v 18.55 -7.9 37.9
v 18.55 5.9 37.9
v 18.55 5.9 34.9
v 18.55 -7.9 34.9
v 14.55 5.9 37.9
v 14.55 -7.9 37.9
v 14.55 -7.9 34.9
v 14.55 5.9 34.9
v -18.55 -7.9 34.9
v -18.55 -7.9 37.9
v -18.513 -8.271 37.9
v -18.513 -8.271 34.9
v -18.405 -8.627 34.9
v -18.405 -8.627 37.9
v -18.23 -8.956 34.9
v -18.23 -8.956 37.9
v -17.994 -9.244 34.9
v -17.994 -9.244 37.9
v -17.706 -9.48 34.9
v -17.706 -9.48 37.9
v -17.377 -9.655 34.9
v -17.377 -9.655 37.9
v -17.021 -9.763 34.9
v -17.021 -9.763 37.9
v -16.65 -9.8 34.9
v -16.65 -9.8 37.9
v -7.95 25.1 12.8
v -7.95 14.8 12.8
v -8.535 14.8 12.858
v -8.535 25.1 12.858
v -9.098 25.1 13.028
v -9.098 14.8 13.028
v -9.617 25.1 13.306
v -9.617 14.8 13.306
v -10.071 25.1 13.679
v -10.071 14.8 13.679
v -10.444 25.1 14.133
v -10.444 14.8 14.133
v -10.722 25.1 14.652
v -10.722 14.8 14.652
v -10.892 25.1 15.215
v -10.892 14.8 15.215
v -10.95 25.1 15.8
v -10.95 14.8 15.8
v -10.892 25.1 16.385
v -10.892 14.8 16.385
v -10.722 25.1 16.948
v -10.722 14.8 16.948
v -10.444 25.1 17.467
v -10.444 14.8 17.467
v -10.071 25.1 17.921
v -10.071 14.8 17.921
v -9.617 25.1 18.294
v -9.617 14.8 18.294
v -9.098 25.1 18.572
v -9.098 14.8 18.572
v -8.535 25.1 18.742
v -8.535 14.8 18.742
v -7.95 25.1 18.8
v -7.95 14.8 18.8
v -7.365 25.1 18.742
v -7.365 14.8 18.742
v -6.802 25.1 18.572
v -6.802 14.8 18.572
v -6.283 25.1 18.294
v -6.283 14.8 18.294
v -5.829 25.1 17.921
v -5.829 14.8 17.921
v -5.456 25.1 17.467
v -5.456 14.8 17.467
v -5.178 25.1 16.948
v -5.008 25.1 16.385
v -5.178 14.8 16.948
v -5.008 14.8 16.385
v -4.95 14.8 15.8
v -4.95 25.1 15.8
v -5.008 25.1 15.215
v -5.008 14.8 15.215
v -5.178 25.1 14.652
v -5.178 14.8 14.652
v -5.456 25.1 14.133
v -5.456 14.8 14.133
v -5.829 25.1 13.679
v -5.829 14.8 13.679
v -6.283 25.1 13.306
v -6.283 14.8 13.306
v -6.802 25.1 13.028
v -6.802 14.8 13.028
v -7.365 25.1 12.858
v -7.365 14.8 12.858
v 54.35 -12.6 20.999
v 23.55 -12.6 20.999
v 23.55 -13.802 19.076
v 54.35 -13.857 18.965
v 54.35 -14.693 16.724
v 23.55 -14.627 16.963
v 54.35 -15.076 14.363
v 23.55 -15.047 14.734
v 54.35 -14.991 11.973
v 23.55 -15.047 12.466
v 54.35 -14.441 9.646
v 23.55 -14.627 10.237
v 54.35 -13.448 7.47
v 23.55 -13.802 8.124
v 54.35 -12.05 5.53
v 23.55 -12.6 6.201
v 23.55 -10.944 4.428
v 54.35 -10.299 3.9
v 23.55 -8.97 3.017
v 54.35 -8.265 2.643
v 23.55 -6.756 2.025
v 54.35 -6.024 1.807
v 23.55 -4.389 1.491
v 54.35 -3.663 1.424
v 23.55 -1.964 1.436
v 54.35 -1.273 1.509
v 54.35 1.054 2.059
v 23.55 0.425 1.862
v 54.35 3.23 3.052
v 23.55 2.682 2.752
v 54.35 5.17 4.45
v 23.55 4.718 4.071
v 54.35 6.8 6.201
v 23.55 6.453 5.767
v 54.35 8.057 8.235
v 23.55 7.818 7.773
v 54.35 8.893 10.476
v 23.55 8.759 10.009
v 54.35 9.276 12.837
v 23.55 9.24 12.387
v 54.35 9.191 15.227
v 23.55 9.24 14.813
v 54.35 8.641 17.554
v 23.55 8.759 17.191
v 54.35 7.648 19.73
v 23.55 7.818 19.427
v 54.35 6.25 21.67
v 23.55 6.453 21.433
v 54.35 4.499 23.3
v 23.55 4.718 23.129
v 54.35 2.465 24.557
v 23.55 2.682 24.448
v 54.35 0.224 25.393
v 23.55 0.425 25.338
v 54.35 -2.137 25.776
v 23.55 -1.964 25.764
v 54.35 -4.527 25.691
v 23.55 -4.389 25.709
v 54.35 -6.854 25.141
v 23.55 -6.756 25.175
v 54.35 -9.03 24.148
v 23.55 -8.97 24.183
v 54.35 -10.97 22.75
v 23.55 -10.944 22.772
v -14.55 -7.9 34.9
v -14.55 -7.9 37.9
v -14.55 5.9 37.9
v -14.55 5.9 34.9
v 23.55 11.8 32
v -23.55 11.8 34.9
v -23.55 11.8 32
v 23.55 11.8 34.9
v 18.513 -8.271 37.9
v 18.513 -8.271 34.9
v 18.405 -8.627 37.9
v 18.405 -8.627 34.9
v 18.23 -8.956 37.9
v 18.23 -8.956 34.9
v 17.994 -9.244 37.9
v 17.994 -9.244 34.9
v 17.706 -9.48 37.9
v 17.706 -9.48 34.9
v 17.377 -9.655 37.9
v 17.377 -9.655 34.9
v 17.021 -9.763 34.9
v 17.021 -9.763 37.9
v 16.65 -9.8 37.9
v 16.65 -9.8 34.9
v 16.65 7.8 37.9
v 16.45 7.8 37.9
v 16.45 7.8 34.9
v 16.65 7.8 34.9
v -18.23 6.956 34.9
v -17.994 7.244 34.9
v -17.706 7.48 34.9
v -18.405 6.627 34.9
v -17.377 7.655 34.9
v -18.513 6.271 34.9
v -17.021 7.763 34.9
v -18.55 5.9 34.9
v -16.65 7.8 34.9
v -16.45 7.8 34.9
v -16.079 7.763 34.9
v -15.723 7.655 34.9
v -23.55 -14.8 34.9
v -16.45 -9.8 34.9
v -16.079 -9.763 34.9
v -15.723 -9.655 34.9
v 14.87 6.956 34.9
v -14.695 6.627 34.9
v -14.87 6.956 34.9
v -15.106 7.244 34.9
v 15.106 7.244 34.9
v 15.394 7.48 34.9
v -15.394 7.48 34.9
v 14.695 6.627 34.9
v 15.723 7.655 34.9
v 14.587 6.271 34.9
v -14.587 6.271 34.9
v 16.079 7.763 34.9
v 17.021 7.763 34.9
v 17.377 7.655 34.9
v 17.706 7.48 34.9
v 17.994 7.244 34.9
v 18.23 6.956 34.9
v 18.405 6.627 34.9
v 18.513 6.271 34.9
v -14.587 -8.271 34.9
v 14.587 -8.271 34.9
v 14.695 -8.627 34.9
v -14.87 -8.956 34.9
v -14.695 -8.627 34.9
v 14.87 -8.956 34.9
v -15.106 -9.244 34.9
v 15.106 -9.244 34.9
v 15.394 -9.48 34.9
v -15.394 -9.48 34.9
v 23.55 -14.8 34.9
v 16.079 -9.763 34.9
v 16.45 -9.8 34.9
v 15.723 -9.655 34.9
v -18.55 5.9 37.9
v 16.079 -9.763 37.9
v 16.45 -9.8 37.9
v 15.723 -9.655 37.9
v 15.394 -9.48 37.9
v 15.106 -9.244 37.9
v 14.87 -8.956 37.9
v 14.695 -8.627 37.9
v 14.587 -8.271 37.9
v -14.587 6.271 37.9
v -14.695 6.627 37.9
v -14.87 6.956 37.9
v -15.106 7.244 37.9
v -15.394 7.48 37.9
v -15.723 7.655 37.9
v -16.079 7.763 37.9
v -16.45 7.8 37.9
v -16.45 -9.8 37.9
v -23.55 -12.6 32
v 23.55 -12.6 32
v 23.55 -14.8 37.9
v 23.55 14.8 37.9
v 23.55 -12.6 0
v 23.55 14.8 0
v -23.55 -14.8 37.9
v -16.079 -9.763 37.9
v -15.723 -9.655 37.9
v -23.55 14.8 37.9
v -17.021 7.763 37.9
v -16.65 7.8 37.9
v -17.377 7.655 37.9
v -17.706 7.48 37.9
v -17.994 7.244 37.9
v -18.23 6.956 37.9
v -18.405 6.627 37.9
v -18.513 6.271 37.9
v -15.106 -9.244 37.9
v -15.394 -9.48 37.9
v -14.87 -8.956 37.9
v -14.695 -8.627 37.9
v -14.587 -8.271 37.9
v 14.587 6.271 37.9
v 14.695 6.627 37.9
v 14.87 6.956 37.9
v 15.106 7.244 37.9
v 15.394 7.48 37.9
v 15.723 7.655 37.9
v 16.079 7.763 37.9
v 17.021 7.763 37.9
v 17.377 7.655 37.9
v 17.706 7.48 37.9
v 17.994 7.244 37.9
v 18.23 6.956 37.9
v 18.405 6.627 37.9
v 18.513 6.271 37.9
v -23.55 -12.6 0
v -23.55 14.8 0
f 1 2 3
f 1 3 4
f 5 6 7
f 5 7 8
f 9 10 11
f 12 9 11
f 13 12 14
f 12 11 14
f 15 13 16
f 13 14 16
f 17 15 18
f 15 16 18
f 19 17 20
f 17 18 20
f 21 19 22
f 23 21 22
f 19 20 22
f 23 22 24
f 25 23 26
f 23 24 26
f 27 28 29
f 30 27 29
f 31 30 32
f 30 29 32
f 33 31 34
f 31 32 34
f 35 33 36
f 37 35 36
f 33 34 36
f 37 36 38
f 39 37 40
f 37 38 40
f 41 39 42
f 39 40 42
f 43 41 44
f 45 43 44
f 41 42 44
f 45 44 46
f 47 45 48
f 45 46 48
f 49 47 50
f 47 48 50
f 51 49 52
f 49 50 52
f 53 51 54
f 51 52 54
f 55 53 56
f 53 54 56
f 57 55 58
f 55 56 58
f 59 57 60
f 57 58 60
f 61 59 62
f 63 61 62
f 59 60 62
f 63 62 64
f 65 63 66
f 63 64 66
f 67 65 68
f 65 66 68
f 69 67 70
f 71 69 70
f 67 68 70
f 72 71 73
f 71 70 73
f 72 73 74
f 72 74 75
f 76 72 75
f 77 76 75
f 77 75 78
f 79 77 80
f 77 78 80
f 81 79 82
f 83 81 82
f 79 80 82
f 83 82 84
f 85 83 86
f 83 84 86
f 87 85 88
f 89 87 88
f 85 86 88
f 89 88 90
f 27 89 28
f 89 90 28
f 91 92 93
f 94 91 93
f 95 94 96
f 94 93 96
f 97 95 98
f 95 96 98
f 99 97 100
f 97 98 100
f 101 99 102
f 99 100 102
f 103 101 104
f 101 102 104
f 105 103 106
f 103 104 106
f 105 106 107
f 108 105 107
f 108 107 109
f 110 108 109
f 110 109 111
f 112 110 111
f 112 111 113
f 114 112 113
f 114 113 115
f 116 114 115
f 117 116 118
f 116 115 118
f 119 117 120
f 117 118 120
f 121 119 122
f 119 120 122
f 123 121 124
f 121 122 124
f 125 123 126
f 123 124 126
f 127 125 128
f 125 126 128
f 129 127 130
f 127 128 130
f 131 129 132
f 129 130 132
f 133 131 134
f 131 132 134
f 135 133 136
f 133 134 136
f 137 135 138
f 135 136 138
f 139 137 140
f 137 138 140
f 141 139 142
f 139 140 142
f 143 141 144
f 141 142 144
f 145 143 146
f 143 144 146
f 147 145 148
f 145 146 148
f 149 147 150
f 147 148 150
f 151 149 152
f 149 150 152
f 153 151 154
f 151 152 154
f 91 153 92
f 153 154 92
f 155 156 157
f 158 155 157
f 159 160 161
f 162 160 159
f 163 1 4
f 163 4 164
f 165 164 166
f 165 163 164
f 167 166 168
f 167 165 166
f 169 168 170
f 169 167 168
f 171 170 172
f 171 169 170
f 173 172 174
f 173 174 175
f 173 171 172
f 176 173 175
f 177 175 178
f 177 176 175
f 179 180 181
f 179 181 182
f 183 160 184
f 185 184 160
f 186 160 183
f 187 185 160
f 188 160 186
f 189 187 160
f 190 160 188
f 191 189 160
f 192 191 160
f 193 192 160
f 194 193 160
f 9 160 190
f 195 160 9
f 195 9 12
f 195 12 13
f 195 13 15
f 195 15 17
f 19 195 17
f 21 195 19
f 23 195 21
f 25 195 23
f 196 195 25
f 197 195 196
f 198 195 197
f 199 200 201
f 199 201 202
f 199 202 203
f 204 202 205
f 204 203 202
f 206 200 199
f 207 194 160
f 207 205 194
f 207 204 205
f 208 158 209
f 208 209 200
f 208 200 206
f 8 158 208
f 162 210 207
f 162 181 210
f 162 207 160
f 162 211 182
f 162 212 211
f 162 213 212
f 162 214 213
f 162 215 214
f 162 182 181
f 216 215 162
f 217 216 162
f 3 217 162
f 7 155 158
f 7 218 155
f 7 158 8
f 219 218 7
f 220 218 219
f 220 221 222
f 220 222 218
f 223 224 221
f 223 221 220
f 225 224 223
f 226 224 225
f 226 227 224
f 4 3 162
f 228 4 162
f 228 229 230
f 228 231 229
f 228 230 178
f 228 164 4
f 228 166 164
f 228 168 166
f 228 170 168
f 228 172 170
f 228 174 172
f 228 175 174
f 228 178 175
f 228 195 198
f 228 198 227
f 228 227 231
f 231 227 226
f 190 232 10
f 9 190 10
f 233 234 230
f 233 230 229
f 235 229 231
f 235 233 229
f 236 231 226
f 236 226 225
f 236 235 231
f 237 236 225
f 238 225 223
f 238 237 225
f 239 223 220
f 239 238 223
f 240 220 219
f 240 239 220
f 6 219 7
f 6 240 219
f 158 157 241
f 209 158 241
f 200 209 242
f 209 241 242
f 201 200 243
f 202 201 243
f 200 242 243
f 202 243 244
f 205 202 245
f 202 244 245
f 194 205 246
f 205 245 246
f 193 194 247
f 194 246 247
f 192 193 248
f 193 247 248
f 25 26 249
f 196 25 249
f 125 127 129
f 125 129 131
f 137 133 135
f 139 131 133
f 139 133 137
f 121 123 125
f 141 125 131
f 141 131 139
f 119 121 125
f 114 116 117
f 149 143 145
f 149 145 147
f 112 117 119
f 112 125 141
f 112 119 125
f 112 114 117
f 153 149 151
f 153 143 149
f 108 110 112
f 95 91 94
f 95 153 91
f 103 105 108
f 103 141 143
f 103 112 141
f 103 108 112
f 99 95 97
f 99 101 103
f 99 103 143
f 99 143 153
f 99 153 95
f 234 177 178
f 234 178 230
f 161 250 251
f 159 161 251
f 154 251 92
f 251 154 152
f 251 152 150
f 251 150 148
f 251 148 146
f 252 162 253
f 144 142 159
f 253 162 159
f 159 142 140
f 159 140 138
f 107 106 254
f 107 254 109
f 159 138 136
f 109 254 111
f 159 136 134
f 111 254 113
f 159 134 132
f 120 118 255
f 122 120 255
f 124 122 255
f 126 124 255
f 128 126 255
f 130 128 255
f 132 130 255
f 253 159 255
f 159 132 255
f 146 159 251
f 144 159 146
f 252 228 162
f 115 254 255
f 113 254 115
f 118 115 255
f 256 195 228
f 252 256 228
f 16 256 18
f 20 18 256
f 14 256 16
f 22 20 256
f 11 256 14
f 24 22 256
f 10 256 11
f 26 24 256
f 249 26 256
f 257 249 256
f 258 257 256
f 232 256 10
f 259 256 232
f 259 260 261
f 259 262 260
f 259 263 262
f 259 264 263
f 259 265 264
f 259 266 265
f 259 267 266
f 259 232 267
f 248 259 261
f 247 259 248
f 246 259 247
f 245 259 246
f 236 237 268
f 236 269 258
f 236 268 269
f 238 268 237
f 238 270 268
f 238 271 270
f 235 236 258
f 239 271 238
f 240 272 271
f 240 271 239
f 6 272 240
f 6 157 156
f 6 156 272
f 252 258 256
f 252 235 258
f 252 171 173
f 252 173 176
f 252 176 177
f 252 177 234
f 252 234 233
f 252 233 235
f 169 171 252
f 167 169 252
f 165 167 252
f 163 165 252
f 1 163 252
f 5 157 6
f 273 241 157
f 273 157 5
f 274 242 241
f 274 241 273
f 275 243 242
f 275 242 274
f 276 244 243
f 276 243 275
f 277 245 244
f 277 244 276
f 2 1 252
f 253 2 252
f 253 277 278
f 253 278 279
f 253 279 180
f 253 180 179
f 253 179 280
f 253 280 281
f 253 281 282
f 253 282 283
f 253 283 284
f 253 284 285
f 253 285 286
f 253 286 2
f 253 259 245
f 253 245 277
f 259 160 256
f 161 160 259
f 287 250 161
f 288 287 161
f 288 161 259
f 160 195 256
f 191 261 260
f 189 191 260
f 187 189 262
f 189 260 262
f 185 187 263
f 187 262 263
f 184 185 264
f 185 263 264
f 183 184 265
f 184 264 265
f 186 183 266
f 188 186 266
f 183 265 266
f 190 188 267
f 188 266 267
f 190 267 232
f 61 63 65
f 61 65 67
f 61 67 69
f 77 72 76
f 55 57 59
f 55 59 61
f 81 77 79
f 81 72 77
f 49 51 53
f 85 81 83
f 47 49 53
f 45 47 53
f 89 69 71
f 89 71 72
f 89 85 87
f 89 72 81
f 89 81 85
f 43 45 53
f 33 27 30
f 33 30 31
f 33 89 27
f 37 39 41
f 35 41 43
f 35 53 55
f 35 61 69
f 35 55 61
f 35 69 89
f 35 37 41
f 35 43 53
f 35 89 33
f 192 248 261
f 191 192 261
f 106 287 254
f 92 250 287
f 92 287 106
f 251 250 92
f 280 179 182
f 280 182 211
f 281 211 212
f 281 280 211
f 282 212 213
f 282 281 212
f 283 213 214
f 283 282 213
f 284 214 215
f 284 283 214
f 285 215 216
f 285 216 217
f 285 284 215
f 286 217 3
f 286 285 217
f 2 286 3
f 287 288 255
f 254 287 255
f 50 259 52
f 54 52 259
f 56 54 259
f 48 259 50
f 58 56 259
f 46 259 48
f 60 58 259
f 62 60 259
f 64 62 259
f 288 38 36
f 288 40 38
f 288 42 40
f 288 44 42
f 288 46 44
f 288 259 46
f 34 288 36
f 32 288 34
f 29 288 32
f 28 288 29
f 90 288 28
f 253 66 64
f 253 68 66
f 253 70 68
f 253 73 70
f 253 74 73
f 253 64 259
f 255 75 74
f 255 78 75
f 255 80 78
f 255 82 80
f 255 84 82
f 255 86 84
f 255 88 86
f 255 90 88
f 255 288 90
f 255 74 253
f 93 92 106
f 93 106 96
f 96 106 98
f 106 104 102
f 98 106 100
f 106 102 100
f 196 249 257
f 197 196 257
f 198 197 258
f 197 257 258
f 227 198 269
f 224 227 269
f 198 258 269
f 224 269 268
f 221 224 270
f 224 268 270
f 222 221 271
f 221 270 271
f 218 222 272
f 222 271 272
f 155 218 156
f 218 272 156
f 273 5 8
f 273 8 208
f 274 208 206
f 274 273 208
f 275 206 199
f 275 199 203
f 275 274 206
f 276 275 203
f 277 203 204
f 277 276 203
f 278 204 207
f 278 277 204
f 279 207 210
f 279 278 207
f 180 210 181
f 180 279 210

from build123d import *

# Parameters (mm, degrees)
SKETCH_4_W            = 47.1
SKETCH_4_H            = 29.6
EXTRUDE_256_DEPTH     = 37.9
SKETCH_8_W            = 47.1
SKETCH_8_H            = 32
CUT_EXTRUDE_1_DEPTH   = 2.2
SKETCH_12_W           = 47.1
SKETCH_12_H           = 2.9
CUT_EXTRUDE_619_DEPTH = 26.6
CUT_EXTRUDE_3_DEPTH   = 3
SKETCH_17_R           = 3
EXTRUDE_1677_DEPTH    = 10.3
SKETCH_19_R           = 12.2
EXTRUDE_1895_DEPTH    = 30.8


with BuildPart() as part:
    # 草图4 → Extrude 256 (new body)
    with BuildSketch(Plane.XY):
        Rectangle(SKETCH_4_W, SKETCH_4_H)
    extrude(amount=EXTRUDE_256_DEPTH)

    # 草图8 → 切除-拉伸1 (cut)
    with BuildSketch(Plane.XZ.offset(14.8)):
        with Locations((0, 16)):
            Rectangle(SKETCH_8_W, SKETCH_8_H)
    extrude(amount=-CUT_EXTRUDE_1_DEPTH, mode=Mode.SUBTRACT)

    # 草图12 → Cut-Extrude 619 (cut)
    with BuildSketch(Plane.XZ.offset(14.8)):
        with Locations((0, 33.45)):
            Rectangle(SKETCH_12_W, SKETCH_12_H)
    extrude(amount=-CUT_EXTRUDE_619_DEPTH, mode=Mode.SUBTRACT)

    # 草图14 → 切除-拉伸3 (cut)
    with BuildSketch(Plane.XY.offset(37.9)):
        with BuildLine():
            ThreePointArc((-14.55, 5.9), (-15.106497116, 7.243502884), (-16.45, 7.8))
            Line((-16.45, 7.8), (-16.65, 7.8))
            ThreePointArc((-16.65, 7.8), (-17.993502884, 7.243502884), (-18.55, 5.9))
            Line((-18.55, 5.9), (-18.55, -7.9))
            ThreePointArc((-18.55, -7.9), (-17.993502884, -9.243502884), (-16.65, -9.8))
            Line((-16.65, -9.8), (-16.45, -9.8))
            ThreePointArc((-16.45, -9.8), (-15.106497116, -9.243502884), (-14.55, -7.9))
            Line((-14.55, -7.9), (-14.55, 5.9))
        make_face()
    cut_extrude_3 = extrude(amount=-CUT_EXTRUDE_3_DEPTH, mode=Mode.SUBTRACT)

    # 镜向3: 切除-拉伸3 across plane
    add(cut_extrude_3.mirror(Plane(origin=(0, 0, 0), x_dir=(0, 0, 1), z_dir=(1, 0, 0))), mode=Mode.SUBTRACT)

    # 草图17 → Extrude 1677 (add)
    with BuildSketch(Plane(origin=(0, 14.8, 0), x_dir=(1, 0, 0), z_dir=(0, 1, 0))):
        with Locations(Location((-7.95, -15.8, 0), (0, 0, 90))):
            Circle(SKETCH_17_R)
    extrude(amount=EXTRUDE_1677_DEPTH)

    # 草图19 → Extrude 1895 (add)
    with BuildSketch(Plane(origin=(23.55, 0, 0), x_dir=(0, 0, -1), z_dir=(1, 0, 0))):
        with Locations(Location((-13.6, -2.9, 0), (0, 0, 232.66299834))):
            Circle(SKETCH_19_R)
    extrude(amount=EXTRUDE_1895_DEPTH)


solid = part.part
